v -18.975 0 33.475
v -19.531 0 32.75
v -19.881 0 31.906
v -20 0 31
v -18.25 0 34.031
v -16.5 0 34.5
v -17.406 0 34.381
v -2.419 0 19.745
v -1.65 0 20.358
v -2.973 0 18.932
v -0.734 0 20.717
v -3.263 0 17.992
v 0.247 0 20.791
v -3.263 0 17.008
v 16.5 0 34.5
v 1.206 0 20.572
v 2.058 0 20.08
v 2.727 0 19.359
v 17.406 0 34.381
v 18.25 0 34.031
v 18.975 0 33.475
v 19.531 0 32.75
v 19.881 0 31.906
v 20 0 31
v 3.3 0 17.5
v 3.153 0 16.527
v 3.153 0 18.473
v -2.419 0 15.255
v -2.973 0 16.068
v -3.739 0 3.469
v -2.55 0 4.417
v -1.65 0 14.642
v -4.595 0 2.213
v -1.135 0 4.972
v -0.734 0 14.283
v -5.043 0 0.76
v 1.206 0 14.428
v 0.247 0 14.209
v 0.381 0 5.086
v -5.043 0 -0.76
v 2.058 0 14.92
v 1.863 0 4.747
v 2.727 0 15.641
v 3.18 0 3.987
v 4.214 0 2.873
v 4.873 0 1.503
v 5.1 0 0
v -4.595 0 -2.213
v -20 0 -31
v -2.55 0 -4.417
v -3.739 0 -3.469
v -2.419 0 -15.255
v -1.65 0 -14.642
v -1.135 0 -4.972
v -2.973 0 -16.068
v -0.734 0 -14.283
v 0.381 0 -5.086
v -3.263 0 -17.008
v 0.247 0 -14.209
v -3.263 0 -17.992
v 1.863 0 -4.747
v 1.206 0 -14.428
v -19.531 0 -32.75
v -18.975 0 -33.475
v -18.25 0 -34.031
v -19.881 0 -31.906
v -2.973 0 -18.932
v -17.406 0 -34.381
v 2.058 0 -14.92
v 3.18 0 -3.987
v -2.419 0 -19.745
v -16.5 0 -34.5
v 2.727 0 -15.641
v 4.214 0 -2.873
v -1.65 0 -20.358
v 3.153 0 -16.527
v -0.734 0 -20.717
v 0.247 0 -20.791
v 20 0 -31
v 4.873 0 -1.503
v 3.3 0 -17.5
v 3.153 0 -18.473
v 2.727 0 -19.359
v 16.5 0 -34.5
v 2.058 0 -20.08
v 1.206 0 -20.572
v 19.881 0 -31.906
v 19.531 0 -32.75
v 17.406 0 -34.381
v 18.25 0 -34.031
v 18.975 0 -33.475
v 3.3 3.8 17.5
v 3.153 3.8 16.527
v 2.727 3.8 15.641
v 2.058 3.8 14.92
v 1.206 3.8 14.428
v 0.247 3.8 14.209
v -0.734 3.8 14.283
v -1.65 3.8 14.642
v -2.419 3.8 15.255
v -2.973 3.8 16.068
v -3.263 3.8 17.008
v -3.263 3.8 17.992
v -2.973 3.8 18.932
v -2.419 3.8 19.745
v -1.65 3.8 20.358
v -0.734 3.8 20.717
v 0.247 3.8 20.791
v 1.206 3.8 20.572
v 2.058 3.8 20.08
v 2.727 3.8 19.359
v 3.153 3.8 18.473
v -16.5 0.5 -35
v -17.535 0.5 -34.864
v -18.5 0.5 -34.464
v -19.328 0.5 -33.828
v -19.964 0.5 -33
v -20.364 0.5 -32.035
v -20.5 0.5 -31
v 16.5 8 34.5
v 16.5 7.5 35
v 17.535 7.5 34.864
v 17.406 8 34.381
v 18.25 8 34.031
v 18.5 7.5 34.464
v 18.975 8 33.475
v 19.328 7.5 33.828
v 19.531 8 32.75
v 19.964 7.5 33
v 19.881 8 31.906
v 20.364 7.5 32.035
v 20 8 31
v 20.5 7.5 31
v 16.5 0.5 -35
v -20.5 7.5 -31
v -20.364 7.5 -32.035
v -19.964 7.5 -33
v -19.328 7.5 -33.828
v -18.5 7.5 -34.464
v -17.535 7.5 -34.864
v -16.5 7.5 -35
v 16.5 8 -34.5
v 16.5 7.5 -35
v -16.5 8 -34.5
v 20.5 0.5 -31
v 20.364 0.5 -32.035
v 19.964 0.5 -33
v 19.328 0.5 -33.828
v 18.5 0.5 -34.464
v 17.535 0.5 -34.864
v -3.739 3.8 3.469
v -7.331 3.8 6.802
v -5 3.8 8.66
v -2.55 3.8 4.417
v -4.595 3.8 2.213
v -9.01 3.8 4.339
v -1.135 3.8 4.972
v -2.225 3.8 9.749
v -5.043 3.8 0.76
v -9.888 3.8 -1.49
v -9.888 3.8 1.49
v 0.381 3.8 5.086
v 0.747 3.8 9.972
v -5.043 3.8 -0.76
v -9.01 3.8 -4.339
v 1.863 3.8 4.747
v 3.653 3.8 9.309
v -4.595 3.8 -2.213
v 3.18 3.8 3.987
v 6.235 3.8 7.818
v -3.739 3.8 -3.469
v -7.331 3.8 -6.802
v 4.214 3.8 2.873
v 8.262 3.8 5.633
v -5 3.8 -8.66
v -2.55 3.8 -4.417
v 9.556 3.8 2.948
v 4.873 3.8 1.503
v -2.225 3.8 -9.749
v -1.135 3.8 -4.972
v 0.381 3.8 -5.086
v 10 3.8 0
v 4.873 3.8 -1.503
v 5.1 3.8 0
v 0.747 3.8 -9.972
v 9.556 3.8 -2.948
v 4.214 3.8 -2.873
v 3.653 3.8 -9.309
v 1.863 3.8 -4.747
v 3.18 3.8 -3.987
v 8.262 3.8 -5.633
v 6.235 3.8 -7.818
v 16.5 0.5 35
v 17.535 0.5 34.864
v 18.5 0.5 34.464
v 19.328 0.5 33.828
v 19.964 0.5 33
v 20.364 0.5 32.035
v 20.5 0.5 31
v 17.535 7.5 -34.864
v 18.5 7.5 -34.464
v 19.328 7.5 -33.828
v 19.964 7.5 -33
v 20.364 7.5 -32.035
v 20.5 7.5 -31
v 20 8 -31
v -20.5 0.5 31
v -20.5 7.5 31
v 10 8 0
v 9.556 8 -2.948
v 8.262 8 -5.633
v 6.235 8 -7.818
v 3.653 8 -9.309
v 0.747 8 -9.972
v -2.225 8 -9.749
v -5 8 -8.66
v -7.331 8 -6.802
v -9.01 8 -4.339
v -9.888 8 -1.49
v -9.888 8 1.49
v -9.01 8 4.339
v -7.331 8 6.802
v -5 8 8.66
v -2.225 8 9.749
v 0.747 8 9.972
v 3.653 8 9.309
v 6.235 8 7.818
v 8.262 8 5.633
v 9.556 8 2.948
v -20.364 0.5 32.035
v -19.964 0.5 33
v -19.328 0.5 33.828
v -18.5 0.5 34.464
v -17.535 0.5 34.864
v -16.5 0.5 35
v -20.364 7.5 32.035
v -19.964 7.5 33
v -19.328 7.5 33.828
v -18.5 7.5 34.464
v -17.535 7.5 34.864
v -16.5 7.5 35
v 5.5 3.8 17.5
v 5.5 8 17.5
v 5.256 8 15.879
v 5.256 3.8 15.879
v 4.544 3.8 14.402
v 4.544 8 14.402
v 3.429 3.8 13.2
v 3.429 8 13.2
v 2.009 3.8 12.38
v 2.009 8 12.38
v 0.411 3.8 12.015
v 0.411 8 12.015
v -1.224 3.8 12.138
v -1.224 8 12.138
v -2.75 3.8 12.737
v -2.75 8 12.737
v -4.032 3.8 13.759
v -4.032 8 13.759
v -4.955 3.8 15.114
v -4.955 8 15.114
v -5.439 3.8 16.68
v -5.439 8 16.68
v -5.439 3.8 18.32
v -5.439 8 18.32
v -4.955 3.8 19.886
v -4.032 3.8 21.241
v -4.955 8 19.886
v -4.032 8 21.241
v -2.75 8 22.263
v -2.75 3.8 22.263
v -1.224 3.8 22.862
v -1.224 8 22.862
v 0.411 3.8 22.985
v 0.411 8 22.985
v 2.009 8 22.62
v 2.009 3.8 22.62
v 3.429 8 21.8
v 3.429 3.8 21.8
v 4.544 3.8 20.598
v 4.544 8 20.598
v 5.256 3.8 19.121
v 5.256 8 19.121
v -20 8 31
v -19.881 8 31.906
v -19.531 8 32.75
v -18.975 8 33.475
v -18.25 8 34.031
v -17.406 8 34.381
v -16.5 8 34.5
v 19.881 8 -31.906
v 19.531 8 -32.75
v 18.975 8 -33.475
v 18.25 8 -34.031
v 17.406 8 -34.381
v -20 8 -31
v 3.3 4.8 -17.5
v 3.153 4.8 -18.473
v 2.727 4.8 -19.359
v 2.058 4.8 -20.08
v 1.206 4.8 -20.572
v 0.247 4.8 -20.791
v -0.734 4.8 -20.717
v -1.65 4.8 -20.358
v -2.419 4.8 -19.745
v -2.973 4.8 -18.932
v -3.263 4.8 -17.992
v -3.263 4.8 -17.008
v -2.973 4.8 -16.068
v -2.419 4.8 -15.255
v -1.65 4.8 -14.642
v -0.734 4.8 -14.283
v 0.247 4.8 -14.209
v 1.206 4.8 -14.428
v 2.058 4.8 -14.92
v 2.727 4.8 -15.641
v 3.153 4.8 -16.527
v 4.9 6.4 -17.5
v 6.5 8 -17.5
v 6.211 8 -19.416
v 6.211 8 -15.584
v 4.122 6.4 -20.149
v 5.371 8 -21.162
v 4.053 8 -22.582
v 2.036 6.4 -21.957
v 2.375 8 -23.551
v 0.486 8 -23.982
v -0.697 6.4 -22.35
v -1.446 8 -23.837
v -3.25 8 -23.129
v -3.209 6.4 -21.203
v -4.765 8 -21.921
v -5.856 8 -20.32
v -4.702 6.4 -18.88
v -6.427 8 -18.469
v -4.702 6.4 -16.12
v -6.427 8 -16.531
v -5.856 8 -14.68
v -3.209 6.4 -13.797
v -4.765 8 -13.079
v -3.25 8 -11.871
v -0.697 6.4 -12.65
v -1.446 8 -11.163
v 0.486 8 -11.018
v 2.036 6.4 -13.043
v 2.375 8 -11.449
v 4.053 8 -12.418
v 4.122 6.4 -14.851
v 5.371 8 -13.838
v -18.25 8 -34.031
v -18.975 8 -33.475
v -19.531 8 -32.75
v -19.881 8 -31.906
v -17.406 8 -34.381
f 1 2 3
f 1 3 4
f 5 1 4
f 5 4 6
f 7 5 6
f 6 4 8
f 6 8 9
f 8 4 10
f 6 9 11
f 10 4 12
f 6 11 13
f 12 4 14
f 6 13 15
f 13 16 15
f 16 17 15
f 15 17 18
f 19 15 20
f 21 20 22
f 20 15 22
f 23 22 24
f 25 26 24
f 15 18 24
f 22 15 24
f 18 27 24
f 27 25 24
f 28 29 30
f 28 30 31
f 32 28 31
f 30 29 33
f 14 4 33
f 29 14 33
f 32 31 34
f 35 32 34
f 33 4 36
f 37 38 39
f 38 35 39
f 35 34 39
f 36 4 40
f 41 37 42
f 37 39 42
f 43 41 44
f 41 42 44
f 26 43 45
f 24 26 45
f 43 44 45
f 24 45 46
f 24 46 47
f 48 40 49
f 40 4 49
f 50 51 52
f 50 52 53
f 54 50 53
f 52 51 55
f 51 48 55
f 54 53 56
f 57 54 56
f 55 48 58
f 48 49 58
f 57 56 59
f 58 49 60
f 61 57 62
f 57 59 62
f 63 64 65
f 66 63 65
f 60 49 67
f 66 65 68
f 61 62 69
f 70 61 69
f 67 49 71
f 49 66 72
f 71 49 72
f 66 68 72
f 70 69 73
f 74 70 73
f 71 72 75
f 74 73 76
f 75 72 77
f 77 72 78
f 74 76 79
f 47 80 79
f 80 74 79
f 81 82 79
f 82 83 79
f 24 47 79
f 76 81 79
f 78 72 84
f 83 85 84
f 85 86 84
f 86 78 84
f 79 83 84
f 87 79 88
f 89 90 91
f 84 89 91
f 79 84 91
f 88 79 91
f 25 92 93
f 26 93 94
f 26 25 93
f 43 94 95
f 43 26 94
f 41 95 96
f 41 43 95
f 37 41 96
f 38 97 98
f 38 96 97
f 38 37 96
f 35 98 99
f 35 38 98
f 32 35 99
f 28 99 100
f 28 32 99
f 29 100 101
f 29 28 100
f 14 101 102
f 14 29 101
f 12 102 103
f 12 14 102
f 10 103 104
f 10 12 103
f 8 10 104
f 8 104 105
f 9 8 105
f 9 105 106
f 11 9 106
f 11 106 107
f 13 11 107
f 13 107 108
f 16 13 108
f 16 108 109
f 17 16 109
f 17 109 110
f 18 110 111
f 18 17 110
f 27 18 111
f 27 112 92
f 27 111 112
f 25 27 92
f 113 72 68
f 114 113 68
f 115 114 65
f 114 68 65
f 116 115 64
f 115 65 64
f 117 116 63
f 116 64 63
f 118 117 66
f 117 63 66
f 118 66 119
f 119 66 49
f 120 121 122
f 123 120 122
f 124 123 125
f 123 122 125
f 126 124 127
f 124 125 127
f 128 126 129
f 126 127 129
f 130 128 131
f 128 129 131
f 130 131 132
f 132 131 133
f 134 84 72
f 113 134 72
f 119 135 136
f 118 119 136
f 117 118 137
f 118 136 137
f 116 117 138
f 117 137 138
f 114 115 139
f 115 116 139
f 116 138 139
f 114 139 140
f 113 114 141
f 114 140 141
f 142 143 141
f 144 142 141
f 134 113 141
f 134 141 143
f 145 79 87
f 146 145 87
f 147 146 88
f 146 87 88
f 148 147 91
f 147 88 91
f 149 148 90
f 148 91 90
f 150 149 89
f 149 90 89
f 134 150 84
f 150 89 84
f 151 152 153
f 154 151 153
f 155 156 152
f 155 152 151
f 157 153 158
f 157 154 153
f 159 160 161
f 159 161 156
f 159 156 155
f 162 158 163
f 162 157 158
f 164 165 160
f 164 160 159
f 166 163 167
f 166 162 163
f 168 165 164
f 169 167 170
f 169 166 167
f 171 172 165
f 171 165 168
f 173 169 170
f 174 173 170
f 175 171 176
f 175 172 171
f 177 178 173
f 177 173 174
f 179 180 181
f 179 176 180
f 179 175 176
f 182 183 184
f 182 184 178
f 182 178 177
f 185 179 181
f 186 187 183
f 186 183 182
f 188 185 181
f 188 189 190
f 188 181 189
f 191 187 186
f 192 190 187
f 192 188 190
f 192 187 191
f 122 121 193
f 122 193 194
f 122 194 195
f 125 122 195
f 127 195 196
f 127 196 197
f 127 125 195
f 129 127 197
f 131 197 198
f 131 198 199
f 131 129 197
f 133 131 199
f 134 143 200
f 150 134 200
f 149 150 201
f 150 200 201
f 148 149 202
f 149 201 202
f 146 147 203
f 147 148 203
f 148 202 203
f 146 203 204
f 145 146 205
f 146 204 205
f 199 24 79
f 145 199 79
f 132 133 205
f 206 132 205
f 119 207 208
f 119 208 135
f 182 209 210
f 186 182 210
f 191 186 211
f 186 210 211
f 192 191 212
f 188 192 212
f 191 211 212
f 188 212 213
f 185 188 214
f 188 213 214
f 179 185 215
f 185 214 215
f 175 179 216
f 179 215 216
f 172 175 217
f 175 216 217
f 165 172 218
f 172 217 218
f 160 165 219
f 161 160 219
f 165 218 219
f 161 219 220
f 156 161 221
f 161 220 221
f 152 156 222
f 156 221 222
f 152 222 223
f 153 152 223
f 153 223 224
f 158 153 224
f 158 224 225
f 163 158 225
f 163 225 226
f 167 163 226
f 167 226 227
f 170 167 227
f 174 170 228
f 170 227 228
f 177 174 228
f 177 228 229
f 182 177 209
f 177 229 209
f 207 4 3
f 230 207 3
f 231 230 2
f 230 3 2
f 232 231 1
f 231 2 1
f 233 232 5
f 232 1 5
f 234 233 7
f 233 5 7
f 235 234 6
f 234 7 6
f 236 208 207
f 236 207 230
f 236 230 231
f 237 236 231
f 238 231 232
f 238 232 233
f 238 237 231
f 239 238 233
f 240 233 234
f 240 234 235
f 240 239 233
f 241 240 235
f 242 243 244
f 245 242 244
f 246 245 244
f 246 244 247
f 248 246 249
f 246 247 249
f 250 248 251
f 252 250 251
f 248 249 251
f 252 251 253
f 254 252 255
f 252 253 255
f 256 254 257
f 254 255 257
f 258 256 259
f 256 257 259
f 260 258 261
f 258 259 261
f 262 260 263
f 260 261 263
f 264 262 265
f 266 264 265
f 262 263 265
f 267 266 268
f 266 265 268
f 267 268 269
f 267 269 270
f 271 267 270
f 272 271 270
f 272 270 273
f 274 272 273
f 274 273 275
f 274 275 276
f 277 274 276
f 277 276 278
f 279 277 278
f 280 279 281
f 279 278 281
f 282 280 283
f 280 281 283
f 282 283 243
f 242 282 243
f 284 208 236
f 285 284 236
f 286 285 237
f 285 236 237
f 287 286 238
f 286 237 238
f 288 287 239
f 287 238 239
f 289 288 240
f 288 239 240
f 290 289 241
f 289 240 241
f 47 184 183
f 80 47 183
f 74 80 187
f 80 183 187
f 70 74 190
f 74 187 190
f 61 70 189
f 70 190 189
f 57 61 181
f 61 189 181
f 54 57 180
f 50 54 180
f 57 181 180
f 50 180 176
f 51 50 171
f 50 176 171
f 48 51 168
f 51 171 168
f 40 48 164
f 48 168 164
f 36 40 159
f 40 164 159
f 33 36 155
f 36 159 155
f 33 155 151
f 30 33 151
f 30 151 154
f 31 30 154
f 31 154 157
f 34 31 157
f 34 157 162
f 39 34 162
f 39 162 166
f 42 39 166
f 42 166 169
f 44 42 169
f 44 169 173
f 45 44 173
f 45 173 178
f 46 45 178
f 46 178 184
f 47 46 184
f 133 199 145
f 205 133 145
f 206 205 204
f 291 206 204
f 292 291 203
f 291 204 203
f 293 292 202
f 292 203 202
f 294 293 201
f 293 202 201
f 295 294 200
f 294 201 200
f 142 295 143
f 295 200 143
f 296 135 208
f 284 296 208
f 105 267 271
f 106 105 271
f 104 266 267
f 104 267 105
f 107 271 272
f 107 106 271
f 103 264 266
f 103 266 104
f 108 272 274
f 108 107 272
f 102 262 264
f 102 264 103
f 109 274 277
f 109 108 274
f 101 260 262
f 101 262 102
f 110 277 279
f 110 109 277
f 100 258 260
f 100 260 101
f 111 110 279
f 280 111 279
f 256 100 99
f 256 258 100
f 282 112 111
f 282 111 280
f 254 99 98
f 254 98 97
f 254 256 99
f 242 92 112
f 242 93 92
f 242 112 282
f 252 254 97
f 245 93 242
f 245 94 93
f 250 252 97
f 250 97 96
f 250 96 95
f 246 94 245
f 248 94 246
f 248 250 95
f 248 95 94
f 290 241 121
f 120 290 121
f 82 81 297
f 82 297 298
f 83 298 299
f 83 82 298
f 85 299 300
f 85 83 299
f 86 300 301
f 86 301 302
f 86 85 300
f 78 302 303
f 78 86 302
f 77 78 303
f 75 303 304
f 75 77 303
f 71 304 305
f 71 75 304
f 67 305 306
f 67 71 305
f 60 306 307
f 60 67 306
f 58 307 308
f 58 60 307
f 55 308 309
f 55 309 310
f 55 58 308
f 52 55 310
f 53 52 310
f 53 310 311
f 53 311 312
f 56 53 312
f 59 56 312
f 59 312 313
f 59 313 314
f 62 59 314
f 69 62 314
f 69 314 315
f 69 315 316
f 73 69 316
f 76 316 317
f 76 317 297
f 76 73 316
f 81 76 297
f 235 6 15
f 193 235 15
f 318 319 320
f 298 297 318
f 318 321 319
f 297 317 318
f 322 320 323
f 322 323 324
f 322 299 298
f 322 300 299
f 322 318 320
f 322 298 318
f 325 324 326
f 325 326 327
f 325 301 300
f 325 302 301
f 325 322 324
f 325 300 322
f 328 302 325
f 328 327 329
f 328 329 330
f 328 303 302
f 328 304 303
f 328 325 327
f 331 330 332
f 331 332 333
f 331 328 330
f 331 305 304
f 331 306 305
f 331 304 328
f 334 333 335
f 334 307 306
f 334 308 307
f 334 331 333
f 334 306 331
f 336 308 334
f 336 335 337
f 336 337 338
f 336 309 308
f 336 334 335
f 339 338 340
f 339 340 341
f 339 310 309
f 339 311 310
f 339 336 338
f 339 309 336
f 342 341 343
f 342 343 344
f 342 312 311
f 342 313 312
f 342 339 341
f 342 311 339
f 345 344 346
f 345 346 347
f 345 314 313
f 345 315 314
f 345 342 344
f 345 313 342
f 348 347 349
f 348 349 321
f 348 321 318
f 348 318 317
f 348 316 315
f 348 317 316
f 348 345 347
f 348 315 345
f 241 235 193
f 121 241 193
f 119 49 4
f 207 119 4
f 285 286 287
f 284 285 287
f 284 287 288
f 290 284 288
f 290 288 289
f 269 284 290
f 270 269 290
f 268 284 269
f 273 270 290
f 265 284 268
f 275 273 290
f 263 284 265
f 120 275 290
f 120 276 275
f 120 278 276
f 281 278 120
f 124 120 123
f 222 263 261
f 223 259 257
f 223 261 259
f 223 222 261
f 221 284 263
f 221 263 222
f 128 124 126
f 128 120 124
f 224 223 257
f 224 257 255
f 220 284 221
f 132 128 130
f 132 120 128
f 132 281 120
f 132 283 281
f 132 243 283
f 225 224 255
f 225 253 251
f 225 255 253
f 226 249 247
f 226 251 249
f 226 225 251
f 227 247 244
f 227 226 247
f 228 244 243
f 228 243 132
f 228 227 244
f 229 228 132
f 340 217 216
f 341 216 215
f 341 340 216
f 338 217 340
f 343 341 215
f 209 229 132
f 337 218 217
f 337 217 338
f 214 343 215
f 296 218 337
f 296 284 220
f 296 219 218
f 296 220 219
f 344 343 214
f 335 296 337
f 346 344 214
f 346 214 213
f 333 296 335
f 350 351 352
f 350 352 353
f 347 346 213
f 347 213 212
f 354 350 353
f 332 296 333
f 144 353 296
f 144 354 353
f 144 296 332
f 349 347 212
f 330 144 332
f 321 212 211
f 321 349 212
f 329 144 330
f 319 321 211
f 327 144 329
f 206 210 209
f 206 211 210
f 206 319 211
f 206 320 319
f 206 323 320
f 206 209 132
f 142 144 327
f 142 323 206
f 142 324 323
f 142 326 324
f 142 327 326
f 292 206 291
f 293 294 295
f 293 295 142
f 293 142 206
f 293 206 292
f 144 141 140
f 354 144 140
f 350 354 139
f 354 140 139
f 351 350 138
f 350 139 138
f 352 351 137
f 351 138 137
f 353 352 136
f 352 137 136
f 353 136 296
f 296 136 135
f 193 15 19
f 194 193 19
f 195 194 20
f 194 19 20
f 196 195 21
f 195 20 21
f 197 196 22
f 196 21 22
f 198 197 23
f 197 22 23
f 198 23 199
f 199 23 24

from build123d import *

# Parameters (mm, degrees)
SKETCH1_W           = 41
SKETCH1_H           = 70
SKETCH1_R           = 3.3
BOSS_EXTRUDE1_DEPTH = 8
SKETCH2_R           = 5.5
CUT_EXTRUDE1_DEPTH  = 4.2
CHAMFER2_SIZE       = 3.2
FILLET1_R           = 4
CHAMFER4_SIZE       = 0.5
SKETCH4_R           = 5.1
CUT_EXTRUDE3_DEPTH  = 9
SKETCH5_R           = 10
CUT_EXTRUDE4_DEPTH  = 4.2


with BuildPart() as part:
    # Sketch1 → Boss-Extrude1 (new body)
    with BuildSketch(Plane(origin=(0, 0, 0), x_dir=(1, 0, 0), z_dir=(0, 1, 0))):
        Rectangle(SKETCH1_W, SKETCH1_H)
        with Locations((0, 17.5)):
            Circle(SKETCH1_R, mode=Mode.SUBTRACT)
        with Locations((0, -17.5)):
            Circle(SKETCH1_R, mode=Mode.SUBTRACT)
    extrude(amount=BOSS_EXTRUDE1_DEPTH)

    # Sketch2 → Cut-Extrude1 (cut)
    with BuildSketch(Plane(origin=(0, 8, 0), x_dir=(1, 0, 0), z_dir=(0, 1, 0))):
        with Locations((0, -17.5)):
            Circle(SKETCH2_R)
    extrude(amount=-CUT_EXTRUDE1_DEPTH, mode=Mode.SUBTRACT)

    # Chamfer2
    chamfer2_edges = [part.edges().sort_by_distance(p)[0] for p in [
        (-3.3, 8, -17.5),
    ]]
    chamfer(chamfer2_edges, length=CHAMFER2_SIZE)

    # Fillet1
    fillet1_edges = [part.edges().sort_by_distance(p)[0] for p in [
        (20.5, 4, 35),
        (-20.5, 4, 35),
        (-20.5, 4, -35),
        (20.5, 4, -35),
    ]]
    fillet(fillet1_edges, radius=FILLET1_R)

    # Chamfer4
    chamfer4_edges = [part.edges().sort_by_distance(p)[0] for p in [
        (0, 0, 35),
        (0, 8, 35),
        (20.5, 0, 0),
        (-20.5, 0, 0),
        (0, 0, -35),
        (-19.328427125, 0, -33.828427125),
        (19.328427125, 0, -33.828427125),
        (19.328427125, 0, 33.828427125),
        (-19.328427125, 0, 33.828427125),
        (-20.5, 8, 0),
        (20.5, 8, 0),
        (0, 8, -35),
        (-19.328427125, 8, -33.828427125),
        (19.328427125, 8, -33.828427125),
        (19.328427125, 8, 33.828427125),
        (-19.328427125, 8, 33.828427125),
    ]]
    chamfer(chamfer4_edges, length=CHAMFER4_SIZE)

    # Sketch4 → Cut-Extrude3 (cut, through all)
    with BuildSketch(Plane(origin=(0, 8, 0), x_dir=(1, 0, 0), z_dir=(0, 1, 0))):
        Circle(SKETCH4_R)
    extrude(amount=-CUT_EXTRUDE3_DEPTH, mode=Mode.SUBTRACT)

    # Sketch5 → Cut-Extrude4 (cut)
    with BuildSketch(Plane(origin=(0, 8, 0), x_dir=(1, 0, 0), z_dir=(0, 1, 0))):
        Circle(SKETCH5_R)
    extrude(amount=-CUT_EXTRUDE4_DEPTH, mode=Mode.SUBTRACT)


solid = part.part
